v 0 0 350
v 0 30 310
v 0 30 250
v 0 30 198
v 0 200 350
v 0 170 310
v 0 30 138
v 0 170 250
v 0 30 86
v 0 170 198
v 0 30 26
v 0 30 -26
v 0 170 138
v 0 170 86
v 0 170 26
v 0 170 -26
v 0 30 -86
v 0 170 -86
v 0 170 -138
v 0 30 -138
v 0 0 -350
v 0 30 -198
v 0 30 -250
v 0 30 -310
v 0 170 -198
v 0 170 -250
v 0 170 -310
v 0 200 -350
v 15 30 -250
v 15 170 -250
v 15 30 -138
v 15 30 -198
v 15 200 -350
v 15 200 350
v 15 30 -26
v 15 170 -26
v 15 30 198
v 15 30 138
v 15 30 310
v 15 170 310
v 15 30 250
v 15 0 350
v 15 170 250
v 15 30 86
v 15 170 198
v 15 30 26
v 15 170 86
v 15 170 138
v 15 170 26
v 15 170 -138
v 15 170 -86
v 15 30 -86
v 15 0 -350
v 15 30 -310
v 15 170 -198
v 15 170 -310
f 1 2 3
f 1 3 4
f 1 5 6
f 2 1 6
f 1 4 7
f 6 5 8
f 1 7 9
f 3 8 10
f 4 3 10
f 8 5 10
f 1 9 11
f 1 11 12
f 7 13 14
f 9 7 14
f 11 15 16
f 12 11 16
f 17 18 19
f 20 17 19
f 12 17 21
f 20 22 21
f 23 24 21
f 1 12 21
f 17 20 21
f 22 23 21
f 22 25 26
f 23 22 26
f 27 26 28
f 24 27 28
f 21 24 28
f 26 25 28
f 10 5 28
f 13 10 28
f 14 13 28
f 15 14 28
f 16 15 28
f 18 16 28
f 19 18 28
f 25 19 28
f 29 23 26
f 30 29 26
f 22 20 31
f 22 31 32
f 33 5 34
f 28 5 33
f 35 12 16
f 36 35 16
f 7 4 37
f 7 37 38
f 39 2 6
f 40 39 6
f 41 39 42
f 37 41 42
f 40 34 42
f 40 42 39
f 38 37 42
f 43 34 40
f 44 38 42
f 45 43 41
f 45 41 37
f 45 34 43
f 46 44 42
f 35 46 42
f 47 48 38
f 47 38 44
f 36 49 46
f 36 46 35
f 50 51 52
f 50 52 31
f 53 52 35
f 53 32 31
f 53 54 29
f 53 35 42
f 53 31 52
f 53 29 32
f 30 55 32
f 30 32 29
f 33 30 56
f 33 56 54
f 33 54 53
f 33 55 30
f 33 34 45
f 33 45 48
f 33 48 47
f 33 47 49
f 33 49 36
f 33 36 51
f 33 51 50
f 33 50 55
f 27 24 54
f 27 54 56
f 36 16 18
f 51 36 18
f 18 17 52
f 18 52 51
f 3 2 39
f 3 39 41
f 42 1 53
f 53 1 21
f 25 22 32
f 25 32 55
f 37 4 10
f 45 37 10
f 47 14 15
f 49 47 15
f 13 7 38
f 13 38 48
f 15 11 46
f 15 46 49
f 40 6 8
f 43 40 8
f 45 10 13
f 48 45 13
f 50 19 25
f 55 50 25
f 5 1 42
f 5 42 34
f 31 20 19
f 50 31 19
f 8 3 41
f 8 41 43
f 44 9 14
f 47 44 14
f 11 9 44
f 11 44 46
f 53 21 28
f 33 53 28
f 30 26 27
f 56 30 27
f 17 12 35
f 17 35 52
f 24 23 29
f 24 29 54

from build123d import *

# Parameters (mm, degrees)
SKETCH1_W           = 700
SKETCH1_H           = 200
SKETCH1_W_2         = 60
SKETCH1_H_2         = 140
BOSS_EXTRUDE1_DEPTH = 15


with BuildPart() as part:
    # Sketch1 → Boss-Extrude1 (new body)
    with BuildSketch(Plane(origin=(0, 0, 0), x_dir=(0, 0, -1), z_dir=(1, 0, 0))):
        with Locations((0, 100)):
            Rectangle(SKETCH1_W, SKETCH1_H)
        with Locations((-280, 100)):
            Rectangle(SKETCH1_W_2, SKETCH1_H_2, mode=Mode.SUBTRACT)
        with Locations((-168, 100)):
            Rectangle(SKETCH1_W_2, SKETCH1_H_2, mode=Mode.SUBTRACT)
        with Locations((-56, 100)):
            Rectangle(SKETCH1_W_2, SKETCH1_H_2, mode=Mode.SUBTRACT)
        with Locations((56, 100)):
            Rectangle(SKETCH1_W_2, SKETCH1_H_2, mode=Mode.SUBTRACT)
        with Locations((168, 100)):
            Rectangle(SKETCH1_W_2, SKETCH1_H_2, mode=Mode.SUBTRACT)
        with Locations((280, 100)):
            Rectangle(SKETCH1_W_2, SKETCH1_H_2, mode=Mode.SUBTRACT)
    extrude(amount=BOSS_EXTRUDE1_DEPTH)


solid = part.part
